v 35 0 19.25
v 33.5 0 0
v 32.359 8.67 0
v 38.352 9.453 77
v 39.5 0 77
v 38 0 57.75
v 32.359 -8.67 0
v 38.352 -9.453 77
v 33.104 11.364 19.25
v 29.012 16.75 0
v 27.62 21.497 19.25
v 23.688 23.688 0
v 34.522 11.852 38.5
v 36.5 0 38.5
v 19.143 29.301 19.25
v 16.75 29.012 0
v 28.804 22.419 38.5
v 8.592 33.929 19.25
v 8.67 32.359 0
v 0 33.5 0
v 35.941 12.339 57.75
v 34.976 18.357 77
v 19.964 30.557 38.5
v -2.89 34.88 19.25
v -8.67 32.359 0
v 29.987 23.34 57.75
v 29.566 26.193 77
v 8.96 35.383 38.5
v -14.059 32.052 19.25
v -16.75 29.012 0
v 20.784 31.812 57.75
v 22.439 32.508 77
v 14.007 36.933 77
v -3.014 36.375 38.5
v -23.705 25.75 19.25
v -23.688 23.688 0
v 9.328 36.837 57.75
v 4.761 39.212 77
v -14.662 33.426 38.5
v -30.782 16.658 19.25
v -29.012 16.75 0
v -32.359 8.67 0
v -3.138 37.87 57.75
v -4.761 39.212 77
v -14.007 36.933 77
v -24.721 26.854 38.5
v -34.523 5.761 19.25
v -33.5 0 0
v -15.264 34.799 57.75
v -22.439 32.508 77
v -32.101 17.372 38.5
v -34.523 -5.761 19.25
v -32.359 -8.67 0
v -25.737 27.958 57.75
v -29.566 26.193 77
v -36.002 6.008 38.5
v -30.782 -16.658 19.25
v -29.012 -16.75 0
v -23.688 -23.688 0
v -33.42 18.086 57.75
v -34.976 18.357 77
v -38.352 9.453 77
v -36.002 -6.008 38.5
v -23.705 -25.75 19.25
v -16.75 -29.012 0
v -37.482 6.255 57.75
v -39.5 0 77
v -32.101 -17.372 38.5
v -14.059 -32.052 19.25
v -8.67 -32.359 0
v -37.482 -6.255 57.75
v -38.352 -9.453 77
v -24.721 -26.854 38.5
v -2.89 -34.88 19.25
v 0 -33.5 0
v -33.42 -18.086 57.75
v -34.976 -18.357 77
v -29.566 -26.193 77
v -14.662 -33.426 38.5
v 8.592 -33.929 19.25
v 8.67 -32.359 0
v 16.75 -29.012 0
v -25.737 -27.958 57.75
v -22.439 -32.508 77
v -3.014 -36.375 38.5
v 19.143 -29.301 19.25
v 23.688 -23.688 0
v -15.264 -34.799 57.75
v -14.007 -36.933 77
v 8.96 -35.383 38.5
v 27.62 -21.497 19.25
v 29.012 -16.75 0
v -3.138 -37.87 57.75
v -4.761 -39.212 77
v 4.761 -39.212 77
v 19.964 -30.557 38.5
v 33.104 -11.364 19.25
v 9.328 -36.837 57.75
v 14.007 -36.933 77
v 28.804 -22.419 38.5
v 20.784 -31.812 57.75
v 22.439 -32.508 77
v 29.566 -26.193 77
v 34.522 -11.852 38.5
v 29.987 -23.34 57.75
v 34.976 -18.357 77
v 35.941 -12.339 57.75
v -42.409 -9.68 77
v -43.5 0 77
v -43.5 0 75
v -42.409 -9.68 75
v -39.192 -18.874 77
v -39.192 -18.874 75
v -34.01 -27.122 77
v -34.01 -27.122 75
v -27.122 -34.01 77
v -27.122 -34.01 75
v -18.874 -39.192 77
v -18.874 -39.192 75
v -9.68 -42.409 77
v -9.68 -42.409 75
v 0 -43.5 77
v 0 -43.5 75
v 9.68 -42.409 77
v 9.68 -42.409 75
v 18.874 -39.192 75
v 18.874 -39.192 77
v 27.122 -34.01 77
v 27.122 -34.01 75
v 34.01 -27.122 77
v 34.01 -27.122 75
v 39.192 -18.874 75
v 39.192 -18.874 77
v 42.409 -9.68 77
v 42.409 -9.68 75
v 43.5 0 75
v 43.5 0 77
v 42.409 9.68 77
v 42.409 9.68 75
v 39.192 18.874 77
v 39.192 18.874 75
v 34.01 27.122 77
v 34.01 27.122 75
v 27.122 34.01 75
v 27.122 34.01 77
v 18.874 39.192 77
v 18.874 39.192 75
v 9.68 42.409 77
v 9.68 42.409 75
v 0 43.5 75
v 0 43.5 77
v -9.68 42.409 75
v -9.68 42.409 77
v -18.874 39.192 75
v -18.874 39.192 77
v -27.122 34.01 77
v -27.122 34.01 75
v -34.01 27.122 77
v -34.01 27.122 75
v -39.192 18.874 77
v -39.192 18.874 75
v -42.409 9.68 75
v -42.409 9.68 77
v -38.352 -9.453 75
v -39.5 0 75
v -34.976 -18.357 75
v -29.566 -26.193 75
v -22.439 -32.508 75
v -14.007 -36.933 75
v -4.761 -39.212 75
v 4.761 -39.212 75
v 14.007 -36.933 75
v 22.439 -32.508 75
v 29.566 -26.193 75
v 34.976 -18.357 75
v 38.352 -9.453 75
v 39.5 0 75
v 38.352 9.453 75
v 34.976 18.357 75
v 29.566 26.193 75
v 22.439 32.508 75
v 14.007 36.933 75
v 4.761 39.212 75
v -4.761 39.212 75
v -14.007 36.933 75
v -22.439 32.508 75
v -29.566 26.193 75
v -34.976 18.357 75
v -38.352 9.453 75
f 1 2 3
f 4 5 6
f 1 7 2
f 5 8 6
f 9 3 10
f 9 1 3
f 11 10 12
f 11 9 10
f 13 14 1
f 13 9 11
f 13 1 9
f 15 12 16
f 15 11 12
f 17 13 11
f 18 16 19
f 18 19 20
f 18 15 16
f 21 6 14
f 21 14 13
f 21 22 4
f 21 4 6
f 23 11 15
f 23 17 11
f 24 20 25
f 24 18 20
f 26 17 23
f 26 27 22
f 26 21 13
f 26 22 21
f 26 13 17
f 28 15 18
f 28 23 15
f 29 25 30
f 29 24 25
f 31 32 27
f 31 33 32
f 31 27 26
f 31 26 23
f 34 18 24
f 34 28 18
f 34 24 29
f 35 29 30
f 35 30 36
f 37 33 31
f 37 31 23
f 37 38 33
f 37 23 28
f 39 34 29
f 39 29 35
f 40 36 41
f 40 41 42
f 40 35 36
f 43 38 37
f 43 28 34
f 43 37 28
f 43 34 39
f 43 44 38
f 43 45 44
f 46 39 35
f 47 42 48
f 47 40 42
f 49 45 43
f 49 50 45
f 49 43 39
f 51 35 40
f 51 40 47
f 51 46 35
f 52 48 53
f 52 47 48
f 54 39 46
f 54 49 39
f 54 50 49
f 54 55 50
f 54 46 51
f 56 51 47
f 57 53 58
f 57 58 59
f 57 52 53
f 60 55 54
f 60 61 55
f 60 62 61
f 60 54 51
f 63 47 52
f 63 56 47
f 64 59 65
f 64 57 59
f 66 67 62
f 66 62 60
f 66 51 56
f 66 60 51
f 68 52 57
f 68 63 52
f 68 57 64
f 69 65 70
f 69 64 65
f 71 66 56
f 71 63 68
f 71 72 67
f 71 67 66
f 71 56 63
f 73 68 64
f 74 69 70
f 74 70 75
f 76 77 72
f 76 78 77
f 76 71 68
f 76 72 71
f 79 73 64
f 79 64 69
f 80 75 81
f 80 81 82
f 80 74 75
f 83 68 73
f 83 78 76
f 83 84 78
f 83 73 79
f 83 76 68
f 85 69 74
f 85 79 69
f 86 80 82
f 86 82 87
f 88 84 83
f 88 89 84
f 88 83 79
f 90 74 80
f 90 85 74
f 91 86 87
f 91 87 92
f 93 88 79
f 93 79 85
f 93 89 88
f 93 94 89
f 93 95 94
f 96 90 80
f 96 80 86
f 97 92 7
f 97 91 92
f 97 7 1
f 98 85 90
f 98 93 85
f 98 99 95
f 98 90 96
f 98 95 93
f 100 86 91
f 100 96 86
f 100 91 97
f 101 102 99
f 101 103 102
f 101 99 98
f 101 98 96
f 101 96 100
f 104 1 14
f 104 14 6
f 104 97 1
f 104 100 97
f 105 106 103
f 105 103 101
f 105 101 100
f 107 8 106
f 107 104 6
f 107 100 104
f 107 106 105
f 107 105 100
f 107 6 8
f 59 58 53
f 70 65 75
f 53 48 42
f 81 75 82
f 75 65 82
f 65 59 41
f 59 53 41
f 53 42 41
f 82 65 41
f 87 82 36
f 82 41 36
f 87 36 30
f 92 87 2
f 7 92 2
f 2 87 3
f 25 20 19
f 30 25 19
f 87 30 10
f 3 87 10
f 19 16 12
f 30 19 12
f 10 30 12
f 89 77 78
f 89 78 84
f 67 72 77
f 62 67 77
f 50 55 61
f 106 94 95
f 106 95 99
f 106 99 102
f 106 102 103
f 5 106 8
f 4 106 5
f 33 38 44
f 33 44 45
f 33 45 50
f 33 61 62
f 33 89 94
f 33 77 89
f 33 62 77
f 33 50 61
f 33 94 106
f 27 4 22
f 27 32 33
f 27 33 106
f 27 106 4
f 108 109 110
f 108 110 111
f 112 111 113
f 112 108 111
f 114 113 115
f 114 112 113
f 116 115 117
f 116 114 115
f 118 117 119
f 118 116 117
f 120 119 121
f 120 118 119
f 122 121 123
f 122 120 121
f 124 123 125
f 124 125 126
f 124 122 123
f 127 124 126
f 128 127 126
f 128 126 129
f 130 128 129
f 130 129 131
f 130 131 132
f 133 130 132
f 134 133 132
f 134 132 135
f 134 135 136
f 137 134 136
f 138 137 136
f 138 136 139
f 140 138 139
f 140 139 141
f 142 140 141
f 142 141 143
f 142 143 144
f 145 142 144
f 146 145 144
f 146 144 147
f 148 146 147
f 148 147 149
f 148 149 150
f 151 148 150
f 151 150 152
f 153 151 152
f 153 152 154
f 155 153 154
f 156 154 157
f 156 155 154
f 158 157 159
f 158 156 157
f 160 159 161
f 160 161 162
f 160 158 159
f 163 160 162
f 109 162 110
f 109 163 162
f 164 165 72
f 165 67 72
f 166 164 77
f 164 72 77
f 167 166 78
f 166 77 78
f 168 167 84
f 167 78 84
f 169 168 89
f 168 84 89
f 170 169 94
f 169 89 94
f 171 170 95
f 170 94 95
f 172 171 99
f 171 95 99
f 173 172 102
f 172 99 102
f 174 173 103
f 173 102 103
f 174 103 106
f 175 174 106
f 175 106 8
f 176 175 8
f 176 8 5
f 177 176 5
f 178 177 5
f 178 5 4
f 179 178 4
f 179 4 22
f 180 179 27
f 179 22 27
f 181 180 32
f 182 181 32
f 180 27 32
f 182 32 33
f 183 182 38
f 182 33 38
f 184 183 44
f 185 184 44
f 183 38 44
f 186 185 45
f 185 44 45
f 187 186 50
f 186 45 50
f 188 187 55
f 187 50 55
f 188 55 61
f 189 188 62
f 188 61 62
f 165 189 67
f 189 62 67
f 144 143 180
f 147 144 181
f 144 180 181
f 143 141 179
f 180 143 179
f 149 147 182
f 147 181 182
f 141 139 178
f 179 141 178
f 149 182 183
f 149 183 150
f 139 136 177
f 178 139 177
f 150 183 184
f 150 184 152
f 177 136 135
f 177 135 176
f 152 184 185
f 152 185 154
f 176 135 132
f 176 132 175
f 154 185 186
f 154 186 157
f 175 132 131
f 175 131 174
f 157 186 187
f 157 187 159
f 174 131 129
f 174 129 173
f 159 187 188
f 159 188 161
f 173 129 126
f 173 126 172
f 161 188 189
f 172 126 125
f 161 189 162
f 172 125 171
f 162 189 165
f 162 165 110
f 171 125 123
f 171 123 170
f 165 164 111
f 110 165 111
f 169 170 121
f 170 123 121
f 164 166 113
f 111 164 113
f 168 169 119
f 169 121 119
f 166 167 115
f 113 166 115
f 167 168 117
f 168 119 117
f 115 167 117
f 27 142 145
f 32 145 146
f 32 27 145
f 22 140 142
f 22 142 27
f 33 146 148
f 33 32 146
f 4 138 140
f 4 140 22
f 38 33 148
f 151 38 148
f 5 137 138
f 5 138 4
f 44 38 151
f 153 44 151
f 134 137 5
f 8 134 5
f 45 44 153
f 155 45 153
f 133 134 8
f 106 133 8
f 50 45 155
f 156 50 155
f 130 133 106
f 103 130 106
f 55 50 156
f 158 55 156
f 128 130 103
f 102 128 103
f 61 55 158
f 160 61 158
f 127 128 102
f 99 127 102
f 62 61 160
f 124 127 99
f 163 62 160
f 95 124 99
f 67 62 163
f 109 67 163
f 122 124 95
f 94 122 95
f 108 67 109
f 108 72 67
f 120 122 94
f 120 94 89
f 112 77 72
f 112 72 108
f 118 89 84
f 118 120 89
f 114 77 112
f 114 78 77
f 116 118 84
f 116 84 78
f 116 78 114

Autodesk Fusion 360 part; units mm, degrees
sketch "Sketch1" plane through (0, 0, 0) normal (0, 0, 1) x (1, 0, 0)
  circle A0 centre (0, 0) radius 33.5
  dimension "d1" = 67
ref_plane "WorkPlane1" through (0, 0, 77) normal (0, 0, 1) x (1, 0, 0)
sketch "Sketch2" plane through (0, 0, 77) normal (0, 0, 1) x (1, 0, 0)
  circle A0 centre (0, 0) radius 39.5
  dimension "d3" = 79
loft "Loft1" add profiles "Sketch1", "Sketch2" section 1 section 2
sketch "Sketch3" plane through (0, 0, 77) normal (0, 0, 1) x (-1, 0, 0)
  circle A0 centre (0, 0) radius 39.5
  circle A1 centre (0, 0) radius 43.5
  dimension "d4" = 87
extrude "Extrude1" add sketch "Sketch3" against normal blind 2
